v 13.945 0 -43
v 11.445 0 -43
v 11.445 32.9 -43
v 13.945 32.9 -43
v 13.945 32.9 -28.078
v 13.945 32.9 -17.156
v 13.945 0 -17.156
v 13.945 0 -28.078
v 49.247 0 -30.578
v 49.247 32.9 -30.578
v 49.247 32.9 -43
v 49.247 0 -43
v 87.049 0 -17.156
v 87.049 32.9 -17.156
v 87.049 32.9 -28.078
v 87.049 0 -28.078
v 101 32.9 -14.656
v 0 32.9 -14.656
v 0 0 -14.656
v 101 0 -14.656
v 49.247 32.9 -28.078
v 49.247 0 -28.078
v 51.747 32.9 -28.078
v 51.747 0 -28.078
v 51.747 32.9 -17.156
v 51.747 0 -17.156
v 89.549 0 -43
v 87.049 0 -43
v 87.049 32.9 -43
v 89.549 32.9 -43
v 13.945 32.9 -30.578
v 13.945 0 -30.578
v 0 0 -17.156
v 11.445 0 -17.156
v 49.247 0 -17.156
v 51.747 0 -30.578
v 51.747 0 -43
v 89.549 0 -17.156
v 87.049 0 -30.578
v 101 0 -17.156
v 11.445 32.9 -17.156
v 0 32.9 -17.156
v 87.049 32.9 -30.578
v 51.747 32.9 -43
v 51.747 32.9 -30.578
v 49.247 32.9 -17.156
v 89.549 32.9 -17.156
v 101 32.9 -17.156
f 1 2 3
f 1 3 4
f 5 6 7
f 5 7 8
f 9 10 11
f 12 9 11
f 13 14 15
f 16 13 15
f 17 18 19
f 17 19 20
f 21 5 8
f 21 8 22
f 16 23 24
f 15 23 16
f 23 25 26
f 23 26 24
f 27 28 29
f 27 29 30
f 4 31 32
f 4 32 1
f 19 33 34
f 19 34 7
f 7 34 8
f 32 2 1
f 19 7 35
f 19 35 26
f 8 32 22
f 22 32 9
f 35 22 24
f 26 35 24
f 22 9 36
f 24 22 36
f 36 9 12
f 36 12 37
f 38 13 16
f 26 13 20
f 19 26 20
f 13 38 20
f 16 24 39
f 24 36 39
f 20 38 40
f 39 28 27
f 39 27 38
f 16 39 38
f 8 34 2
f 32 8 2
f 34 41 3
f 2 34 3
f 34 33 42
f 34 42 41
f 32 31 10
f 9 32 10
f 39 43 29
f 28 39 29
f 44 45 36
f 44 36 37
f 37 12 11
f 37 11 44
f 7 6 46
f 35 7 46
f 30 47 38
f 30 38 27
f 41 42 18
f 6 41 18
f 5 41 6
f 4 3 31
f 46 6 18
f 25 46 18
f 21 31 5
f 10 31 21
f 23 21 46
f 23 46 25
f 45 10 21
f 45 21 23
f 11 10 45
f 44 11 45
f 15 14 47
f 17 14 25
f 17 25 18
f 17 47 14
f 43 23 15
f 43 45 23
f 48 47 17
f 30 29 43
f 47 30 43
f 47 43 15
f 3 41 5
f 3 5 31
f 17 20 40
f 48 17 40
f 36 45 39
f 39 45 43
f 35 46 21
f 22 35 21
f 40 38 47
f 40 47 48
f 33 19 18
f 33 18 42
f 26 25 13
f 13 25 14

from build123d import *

# Parameters (mm, degrees)
SKETCH1_W           = 101
SKETCH1_H           = 43
BOSS_EXTRUDE1_DEPTH = 32.9
SKETCH4_W           = 101
SKETCH4_H           = 14.656
SKETCH4_W_2         = 11.451
SKETCH4_H_2         = 25.844
SKETCH4_W_3         = 11.445
SKETCH4_W_4         = 35.302
SKETCH4_H_3         = 12.422
SKETCH4_H_4         = 10.922
CUT_EXTRUDE2_DEPTH  = 32.9


with BuildPart() as part:
    # Sketch1 → Boss-Extrude1 (new body)
    with BuildSketch(Plane(origin=(0, 0, 0), x_dir=(1, 0, 0), z_dir=(0, 1, 0))):
        with Locations((50.5, 21.5)):
            Rectangle(SKETCH1_W, SKETCH1_H)
    extrude(amount=BOSS_EXTRUDE1_DEPTH)

    # Sketch4 → Cut-Extrude2 (cut)
    with BuildSketch(Plane(origin=(0, 32.9, 0), x_dir=(1, 0, 0), z_dir=(0, 1, 0))):
        with Locations((50.5, 7.328)):
            Rectangle(SKETCH4_W, SKETCH4_H)
        with Locations((95.2745, 30.078)):
            Rectangle(SKETCH4_W_2, SKETCH4_H_2)
        with Locations((5.7225, 30.078)):
            Rectangle(SKETCH4_W_3, SKETCH4_H_2)
        with Locations((31.596, 36.789)):
            Rectangle(SKETCH4_W_4, SKETCH4_H_3)
        with Locations((69.398, 36.789)):
            Rectangle(SKETCH4_W_4, SKETCH4_H_3)
        with Locations((69.398, 22.617)):
            Rectangle(SKETCH4_W_4, SKETCH4_H_4)
        with Locations((31.596, 22.617)):
            Rectangle(SKETCH4_W_4, SKETCH4_H_4)
    extrude(amount=-CUT_EXTRUDE2_DEPTH, mode=Mode.SUBTRACT)


solid = part.part
